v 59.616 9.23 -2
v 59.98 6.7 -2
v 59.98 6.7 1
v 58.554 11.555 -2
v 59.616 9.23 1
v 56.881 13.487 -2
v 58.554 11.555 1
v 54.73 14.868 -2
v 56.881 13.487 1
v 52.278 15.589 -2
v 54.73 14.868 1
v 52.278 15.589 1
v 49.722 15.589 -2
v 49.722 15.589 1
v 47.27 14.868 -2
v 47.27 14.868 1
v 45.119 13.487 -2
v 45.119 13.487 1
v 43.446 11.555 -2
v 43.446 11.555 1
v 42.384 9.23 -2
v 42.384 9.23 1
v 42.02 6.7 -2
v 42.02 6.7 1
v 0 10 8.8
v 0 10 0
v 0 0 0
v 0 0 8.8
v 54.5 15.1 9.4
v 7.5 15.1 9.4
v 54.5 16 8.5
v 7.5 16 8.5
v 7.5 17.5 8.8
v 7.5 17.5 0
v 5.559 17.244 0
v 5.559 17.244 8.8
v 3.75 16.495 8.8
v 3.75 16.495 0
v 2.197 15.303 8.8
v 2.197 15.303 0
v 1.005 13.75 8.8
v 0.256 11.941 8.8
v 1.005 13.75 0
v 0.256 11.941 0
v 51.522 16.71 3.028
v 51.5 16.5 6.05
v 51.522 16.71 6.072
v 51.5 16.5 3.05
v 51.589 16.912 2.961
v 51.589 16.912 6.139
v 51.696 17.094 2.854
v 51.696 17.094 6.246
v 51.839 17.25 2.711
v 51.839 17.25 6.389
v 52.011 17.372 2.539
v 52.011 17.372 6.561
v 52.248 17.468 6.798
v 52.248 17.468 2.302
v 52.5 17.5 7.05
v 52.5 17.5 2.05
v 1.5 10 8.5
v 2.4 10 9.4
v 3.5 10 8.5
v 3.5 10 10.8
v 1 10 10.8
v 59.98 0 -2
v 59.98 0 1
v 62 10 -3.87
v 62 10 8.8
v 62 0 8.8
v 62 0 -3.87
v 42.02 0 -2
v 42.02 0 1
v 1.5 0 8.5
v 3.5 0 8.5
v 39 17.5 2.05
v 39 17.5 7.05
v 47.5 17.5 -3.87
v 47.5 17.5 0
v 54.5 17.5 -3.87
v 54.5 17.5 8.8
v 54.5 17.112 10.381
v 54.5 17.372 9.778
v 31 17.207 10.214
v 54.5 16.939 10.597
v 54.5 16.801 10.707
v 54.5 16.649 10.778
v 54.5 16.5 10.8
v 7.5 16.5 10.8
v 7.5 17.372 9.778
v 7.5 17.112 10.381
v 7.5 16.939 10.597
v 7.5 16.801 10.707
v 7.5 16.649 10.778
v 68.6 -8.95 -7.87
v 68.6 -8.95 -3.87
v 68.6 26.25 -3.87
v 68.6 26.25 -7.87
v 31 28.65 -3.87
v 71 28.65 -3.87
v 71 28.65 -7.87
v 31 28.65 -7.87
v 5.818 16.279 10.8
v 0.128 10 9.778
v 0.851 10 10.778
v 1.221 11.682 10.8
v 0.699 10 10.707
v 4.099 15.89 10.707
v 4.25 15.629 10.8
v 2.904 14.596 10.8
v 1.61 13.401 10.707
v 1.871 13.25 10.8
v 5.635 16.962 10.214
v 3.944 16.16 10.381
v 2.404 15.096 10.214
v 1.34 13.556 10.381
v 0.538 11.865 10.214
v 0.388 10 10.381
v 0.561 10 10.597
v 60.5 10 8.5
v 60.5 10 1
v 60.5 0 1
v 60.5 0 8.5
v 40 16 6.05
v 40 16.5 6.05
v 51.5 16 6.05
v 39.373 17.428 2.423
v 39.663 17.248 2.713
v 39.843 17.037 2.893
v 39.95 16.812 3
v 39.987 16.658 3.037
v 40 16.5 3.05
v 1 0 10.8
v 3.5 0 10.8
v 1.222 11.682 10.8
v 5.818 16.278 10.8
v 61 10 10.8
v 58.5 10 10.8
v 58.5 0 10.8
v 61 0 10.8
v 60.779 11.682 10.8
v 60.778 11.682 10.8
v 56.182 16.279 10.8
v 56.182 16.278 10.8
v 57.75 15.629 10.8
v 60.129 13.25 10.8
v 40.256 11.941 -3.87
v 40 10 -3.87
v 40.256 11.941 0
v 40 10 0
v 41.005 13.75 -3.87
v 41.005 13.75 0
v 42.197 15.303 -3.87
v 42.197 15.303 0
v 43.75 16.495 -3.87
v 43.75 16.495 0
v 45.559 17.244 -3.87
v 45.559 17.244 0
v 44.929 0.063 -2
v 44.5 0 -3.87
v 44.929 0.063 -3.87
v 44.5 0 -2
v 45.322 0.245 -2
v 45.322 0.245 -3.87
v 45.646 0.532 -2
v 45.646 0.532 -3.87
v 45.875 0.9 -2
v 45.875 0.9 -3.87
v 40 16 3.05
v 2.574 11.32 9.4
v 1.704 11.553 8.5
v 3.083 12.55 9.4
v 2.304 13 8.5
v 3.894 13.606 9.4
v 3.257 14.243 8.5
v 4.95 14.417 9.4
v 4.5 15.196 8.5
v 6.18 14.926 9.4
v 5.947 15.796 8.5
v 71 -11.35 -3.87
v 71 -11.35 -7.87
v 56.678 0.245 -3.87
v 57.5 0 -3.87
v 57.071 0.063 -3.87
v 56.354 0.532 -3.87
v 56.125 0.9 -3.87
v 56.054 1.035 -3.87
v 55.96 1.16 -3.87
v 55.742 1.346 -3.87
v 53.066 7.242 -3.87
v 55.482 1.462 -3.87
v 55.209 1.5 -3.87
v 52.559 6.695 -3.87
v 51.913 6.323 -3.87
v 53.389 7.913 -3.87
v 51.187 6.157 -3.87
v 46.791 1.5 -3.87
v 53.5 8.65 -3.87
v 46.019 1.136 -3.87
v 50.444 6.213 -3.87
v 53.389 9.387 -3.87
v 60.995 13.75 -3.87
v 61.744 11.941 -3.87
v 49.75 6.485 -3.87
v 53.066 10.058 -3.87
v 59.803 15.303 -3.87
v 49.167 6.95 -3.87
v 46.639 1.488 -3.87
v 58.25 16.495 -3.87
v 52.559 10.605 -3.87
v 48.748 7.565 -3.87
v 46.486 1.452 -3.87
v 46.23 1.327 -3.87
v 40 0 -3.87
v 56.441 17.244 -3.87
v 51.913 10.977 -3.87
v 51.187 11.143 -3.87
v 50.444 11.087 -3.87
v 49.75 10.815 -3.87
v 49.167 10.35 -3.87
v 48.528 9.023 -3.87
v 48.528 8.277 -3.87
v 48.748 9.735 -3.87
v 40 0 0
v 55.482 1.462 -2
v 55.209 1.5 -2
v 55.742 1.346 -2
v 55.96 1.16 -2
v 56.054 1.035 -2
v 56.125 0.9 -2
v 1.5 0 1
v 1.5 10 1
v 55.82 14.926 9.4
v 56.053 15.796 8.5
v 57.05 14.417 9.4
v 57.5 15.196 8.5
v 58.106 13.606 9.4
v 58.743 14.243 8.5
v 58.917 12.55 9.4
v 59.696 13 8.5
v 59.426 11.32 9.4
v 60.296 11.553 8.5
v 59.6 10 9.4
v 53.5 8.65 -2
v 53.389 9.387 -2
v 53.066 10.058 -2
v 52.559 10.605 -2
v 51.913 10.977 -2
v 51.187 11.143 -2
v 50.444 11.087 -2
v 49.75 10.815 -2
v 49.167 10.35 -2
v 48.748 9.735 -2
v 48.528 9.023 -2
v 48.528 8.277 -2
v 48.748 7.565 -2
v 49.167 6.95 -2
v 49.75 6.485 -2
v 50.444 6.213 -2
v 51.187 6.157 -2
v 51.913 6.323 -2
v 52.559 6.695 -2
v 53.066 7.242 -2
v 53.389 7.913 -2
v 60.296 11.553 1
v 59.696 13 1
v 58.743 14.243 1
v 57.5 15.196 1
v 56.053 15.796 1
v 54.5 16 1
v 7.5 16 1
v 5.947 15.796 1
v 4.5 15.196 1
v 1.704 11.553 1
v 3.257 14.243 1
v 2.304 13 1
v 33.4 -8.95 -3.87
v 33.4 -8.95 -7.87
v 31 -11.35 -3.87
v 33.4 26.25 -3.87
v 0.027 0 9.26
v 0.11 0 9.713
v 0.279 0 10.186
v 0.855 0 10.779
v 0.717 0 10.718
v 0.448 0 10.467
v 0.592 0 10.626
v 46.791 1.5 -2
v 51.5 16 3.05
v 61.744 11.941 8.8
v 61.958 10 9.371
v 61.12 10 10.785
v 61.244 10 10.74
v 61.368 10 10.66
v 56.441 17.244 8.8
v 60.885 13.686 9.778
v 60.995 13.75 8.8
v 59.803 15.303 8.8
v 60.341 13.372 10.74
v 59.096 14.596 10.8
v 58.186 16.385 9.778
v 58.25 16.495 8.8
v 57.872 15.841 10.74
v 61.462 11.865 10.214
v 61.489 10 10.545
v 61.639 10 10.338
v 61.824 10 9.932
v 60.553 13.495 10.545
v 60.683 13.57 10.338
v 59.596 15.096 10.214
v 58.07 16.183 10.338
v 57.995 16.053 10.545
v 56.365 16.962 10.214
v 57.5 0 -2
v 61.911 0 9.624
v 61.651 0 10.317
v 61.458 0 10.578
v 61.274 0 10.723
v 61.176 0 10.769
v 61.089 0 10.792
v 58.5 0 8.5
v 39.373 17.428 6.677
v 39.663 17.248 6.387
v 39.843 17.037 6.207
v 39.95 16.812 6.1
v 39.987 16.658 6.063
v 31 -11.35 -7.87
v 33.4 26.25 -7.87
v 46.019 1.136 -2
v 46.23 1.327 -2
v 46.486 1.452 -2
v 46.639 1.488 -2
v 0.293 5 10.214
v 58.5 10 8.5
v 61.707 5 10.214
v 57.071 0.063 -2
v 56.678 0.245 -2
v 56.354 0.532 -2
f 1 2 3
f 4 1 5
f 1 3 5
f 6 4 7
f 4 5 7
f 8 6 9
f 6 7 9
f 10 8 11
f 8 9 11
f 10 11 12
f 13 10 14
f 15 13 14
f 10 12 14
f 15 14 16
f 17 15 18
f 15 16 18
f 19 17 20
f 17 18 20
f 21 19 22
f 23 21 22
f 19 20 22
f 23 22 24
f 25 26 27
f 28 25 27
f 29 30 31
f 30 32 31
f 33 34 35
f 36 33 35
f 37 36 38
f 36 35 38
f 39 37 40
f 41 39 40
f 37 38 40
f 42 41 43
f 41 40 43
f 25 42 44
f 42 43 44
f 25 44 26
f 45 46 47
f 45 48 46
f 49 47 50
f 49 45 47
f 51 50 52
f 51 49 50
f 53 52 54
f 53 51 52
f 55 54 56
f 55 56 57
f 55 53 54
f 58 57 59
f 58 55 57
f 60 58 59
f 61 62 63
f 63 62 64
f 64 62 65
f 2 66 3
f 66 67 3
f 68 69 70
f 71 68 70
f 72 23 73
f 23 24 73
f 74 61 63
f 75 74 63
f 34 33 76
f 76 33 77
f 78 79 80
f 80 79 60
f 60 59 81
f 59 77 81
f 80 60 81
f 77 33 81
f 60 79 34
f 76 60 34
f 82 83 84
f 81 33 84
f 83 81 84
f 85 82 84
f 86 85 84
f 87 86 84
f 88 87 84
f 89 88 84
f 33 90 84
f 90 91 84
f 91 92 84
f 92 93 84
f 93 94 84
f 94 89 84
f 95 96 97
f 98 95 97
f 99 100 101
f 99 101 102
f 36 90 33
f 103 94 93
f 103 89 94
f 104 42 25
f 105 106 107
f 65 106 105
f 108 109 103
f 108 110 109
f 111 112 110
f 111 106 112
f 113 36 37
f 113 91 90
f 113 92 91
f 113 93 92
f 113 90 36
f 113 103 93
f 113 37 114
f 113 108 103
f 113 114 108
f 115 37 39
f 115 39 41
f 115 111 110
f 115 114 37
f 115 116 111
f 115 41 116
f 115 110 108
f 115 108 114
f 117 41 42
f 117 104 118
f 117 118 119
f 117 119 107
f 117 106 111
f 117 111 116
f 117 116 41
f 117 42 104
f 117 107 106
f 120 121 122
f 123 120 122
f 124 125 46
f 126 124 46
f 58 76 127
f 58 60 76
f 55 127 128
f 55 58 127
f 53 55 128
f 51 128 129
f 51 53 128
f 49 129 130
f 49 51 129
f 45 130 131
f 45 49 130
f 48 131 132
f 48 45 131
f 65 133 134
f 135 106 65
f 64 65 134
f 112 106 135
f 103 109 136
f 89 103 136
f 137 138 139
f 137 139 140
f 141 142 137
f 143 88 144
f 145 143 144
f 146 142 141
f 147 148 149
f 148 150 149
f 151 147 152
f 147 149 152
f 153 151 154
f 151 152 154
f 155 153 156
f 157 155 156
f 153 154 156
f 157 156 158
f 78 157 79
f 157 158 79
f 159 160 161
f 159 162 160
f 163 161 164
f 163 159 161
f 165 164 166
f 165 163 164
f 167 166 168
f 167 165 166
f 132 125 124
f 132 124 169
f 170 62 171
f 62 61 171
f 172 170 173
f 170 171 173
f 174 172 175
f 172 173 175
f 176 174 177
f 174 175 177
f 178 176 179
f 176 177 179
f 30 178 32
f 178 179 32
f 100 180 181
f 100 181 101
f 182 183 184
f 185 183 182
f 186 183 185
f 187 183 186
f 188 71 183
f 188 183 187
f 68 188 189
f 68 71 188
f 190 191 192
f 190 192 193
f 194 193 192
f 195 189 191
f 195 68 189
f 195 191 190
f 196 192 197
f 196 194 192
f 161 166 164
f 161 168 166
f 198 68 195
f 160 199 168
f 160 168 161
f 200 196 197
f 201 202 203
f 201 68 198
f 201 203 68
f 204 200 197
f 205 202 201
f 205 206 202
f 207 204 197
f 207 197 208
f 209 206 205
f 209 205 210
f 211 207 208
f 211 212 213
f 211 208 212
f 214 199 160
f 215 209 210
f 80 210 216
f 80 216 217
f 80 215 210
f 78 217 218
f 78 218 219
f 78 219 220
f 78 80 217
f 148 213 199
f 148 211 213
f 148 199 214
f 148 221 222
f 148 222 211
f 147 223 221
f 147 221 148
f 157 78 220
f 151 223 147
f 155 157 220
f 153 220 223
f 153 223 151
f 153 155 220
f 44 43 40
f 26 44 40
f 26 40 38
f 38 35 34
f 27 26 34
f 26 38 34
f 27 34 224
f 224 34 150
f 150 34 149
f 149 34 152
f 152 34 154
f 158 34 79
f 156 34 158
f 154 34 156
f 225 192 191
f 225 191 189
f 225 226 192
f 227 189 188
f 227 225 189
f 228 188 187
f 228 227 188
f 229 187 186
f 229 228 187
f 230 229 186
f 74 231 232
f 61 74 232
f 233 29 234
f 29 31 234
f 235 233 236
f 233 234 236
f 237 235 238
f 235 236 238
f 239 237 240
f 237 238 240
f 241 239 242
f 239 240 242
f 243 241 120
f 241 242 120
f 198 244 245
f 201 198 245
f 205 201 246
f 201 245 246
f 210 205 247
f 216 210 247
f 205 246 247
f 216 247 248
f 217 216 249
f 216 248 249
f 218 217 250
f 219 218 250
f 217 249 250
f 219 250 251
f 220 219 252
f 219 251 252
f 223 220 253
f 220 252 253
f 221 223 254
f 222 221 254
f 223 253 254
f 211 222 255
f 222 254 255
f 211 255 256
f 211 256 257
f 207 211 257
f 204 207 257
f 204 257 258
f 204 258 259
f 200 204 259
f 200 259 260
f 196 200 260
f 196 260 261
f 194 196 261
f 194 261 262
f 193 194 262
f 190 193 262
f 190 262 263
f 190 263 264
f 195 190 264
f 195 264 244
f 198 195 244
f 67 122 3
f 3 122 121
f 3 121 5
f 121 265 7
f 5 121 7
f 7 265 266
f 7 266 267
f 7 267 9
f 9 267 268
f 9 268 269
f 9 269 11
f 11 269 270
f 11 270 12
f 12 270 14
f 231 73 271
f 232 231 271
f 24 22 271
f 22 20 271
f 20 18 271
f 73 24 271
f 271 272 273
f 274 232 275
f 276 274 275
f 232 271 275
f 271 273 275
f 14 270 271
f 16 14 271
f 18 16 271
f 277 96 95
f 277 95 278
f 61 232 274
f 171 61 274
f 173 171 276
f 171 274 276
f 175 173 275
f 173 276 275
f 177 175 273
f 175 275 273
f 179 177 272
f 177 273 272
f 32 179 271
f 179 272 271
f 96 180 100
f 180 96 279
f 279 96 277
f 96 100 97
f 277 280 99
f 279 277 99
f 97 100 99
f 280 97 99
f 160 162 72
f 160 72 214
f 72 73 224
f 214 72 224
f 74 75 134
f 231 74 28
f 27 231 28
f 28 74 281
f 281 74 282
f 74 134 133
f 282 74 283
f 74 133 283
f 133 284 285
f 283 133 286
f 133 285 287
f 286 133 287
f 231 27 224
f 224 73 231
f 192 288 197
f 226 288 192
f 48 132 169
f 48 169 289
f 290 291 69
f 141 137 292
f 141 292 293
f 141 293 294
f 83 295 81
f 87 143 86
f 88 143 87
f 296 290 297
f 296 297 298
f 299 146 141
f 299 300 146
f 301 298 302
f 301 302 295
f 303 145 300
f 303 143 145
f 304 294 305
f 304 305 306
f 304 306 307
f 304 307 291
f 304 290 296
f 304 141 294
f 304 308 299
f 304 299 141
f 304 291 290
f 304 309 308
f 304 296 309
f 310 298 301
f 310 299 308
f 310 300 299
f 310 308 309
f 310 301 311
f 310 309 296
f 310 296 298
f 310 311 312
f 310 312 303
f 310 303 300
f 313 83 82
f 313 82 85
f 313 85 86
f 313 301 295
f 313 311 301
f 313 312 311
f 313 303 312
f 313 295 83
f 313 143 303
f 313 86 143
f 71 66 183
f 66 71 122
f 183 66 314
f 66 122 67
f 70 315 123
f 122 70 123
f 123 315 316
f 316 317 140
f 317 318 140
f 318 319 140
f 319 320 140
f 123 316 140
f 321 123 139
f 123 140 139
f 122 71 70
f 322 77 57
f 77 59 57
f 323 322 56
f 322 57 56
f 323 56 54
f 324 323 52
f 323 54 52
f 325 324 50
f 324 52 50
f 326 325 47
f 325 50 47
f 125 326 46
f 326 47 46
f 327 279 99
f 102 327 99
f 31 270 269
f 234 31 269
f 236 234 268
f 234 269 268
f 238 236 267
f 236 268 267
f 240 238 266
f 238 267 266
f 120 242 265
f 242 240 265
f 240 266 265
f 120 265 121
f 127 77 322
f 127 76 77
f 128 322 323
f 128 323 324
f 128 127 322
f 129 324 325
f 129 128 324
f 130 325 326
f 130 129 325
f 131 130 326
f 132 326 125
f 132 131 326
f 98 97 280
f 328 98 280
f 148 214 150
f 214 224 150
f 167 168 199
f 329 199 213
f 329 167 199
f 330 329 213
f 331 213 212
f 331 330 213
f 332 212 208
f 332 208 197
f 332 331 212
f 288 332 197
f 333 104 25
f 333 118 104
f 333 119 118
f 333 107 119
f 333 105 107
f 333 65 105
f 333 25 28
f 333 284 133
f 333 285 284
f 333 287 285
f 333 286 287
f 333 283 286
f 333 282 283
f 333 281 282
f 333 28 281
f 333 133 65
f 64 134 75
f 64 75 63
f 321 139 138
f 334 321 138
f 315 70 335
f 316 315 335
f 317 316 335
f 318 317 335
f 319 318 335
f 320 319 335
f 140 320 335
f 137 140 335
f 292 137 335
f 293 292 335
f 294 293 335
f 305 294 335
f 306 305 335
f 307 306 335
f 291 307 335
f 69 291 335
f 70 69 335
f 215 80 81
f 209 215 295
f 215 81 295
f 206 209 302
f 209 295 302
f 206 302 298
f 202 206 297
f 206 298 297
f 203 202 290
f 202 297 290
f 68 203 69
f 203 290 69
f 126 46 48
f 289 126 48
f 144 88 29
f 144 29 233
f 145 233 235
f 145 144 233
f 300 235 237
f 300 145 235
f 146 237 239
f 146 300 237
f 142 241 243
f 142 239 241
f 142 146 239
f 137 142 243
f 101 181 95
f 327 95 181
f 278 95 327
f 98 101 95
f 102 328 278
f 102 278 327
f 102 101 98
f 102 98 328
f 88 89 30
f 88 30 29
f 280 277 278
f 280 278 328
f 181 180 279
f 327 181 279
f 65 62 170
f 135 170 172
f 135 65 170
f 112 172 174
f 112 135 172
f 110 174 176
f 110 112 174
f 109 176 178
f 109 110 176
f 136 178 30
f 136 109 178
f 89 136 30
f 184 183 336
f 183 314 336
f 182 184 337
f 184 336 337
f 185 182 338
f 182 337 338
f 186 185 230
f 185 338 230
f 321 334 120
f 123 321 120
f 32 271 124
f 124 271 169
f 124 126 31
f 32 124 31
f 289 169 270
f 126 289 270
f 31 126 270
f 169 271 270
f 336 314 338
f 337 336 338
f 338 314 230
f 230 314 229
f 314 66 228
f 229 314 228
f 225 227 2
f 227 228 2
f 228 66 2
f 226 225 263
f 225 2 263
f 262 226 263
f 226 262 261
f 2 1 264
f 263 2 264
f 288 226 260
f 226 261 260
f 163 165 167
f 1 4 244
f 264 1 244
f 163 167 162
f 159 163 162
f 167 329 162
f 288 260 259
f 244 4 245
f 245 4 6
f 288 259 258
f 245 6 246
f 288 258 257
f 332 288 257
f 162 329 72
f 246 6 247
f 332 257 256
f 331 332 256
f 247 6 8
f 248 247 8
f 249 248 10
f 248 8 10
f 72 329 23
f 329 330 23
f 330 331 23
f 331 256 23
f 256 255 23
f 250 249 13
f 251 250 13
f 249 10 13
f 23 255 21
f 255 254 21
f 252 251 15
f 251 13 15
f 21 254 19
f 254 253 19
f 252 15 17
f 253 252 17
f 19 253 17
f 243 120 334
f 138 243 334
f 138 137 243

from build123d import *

# Parameters (mm, degrees)
BOSS_EXTRUDE1_DEPTH = 10.8
BOSS_EXTRUDE2_DEPTH = 1
SKETCH3_W           = 2
SKETCH3_H           = 10
BOSS_EXTRUDE3_DEPTH = 2.3
FILLET1_SIZE        = 2
FILLET1_SIZE_2      = 1
CUT_EXTRUDE1_REACH  = 67.321
SKETCH4_W           = 11.5
SKETCH4_H           = 3
BOSS_EXTRUDE4_DEPTH = 2.3
CHAMFER1_SIZE       = 1.5
CUT_EXTRUDE2_DEPTH  = 2
BOSS_EXTRUDE6_DEPTH = 2
FILLET2_R           = 1
BOSS_EXTRUDE7_DEPTH = 1.87
SKETCH11_R          = 2.5
CUT_EXTRUDE3_DEPTH  = 66.681732761
SKETCH19_W          = 10
SKETCH19_H          = 1.87
CUT_EXTRUDE5_DEPTH  = 1.5
FILLET7_R           = 1.5
FILLET8_R           = 1
SKETCH20_W          = 40
SKETCH20_H          = 40
SKETCH20_W_2        = 35.2
SKETCH20_H_2        = 35.2
BOSS_EXTRUDE8_DEPTH = 4


with BuildPart() as part:
    # Sketch1 → Boss-Extrude1 (new body)
    with BuildSketch(Plane.XY):
        with BuildLine():
            Line((31, 16), (31, 17.5))
            Line((31, 17.5), (7.5, 17.5))
            ThreePointArc((7.5, 17.5), (2.196699141, 15.303300859), (0, 10))
            Line((0, 10), (0, 0))
            Line((0, 0), (1.5, 0))
            Line((1.5, 0), (1.5, 10))
            ThreePointArc((1.5, 10), (3.257359313, 14.242640687), (7.5, 16))
            Line((7.5, 16), (31, 16))
        make_face()
        with BuildLine():
            Line((54.5, 17.5), (31, 17.5))
            Line((31, 17.5), (31, 16))
            Line((31, 16), (54.5, 16))
            ThreePointArc((54.5, 16), (58.742640687, 14.242640687), (60.5, 10))
            Line((60.5, 10), (60.5, 0))
            Line((60.5, 0), (62, 0))
            Line((62, 0), (62, 10))
            ThreePointArc((62, 10), (59.803300859, 15.303300859), (54.5, 17.5))
        make_face()
    extrude(amount=BOSS_EXTRUDE1_DEPTH)


with BuildPart() as body_2:
    # Sketch2 → Boss-Extrude2 (new body)
    with BuildSketch(Plane(origin=(0, 0, 0), x_dir=(-1, 0, 0), z_dir=(0, 0, -1))):
        with BuildLine():
            Line((-1.5, 0), (-1.5, 10))
            ThreePointArc((-1.5, 10), (-3.257359313, 14.242640687), (-7.5, 16))
            Line((-7.5, 16), (-54.5, 16))
            ThreePointArc((-54.5, 16), (-58.742640687, 14.242640687), (-60.5, 10))
            Line((-60.5, 10), (-60.5, 0))
            Line((-60.5, 0), (-1.5, 0))
        make_face()
    extrude(amount=-BOSS_EXTRUDE2_DEPTH)

    # Combine1: union part
    add(part.part)

    # Sketch3 → Boss-Extrude3 (add)
    with BuildSketch(Plane.XY.offset(10.8)):
        with Locations((2.5, 5)):
            Rectangle(SKETCH3_W, SKETCH3_H)
        with Locations((59.5, 5)):
            Rectangle(SKETCH3_W, SKETCH3_H)
    extrude(amount=-BOSS_EXTRUDE3_DEPTH)

    # Fillet1
    # a fillet whose section is not a circle: 2, 1 mm, written as the material it takes off along each edge
    with BuildSketch(Plane(origin=(0, 10, 10.8), x_dir=(0, 0, -1), z_dir=(0, -1, 0))) as fillet1_piece_1:
        with BuildLine():
            Bezier((FILLET1_SIZE, 0), (0, 0), (0, FILLET1_SIZE_2), weights=[1, 0.707106781, 1])
            Line((0, FILLET1_SIZE_2), (0, 0))
            Line((0, 0), (FILLET1_SIZE, 0))
        make_face()
    extrude(amount=15, mode=Mode.SUBTRACT)
    with BuildSketch(Plane(origin=(62, -5, 10.8), x_dir=(-1, 0, 0), z_dir=(0, 1, 0))) as fillet1_piece_2:
        with BuildLine():
            Bezier((FILLET1_SIZE_2, 0), (0, 0), (0, -FILLET1_SIZE), weights=[1, 0.707106781, 1])
            Line((0, -FILLET1_SIZE), (0, 0))
            Line((0, 0), (FILLET1_SIZE_2, 0))
        make_face()
    extrude(amount=15, mode=Mode.SUBTRACT)
    with BuildSketch(Plane(origin=(7.5, 10, 10.8), x_dir=(0, 1, 0), z_dir=(1, 0, 0))) as fillet1_piece_3:
        with BuildLine():
            Bezier((7.5, -FILLET1_SIZE), (7.5, 0), (7.5 - FILLET1_SIZE_2, 0), weights=[1, 0.707106781, 1])
            Line((7.5 - FILLET1_SIZE_2, 0), (7.5, 0))
            Line((7.5, 0), (7.5, -FILLET1_SIZE))
        make_face()
    revolve(axis=Axis((7.5, 10, 10.8), (0, 0, 1)), revolution_arc=90, mode=Mode.SUBTRACT)
    with BuildSketch(Plane(origin=(54.5, 10, 10.8), x_dir=(1, 0, 0), z_dir=(0, -1, 0))) as fillet1_piece_4:
        with BuildLine():
            Bezier((7.5, -FILLET1_SIZE), (7.5, 0), (7.5 - FILLET1_SIZE_2, 0), weights=[1, 0.707106781, 1])
            Line((7.5 - FILLET1_SIZE_2, 0), (7.5, 0))
            Line((7.5, 0), (7.5, -FILLET1_SIZE))
        make_face()
    revolve(axis=Axis((54.5, 10, 10.8), (0, 0, 1)), revolution_arc=90, mode=Mode.SUBTRACT)
    with BuildSketch(Plane(origin=(7.5, 17.5, 10.8), x_dir=(0, 0, -1), z_dir=(1, 0, 0))) as fillet1_piece_5:
        with BuildLine():
            Bezier((FILLET1_SIZE, 0), (0, 0), (0, -FILLET1_SIZE_2), weights=[1, 0.707106781, 1])
            Line((0, -FILLET1_SIZE_2), (0, 0))
            Line((0, 0), (FILLET1_SIZE, 0))
        make_face()
    extrude(amount=47, mode=Mode.SUBTRACT)

    # Sketch4 → Cut-Extrude1 (cut, up to next)
    with BuildSketch(Plane(origin=(0, 17.5, 0), x_dir=(1, 0, 0), z_dir=(0, 1, 0)), mode=Mode.PRIVATE) as cut_extrude1_sk1:
        with Locations((45.75, -4.55)):
            Rectangle(SKETCH4_W, SKETCH4_H)
    cut_extrude1_tool1 = extrude(cut_extrude1_sk1.sketch, amount=-CUT_EXTRUDE1_REACH, mode=Mode.PRIVATE) & body_2.part
    add(cut_extrude1_tool1.solids().sort_by_distance((45.75, 17.5, 4.55))[0], mode=Mode.SUBTRACT)

    # Sketch5 → Boss-Extrude4 (add)
    with BuildSketch(Plane.XY.offset(10.8)):
        with BuildLine():
            Line((7.5, 15), (54.5, 15))
            ThreePointArc((54.5, 15), (58.035533906, 13.535533906), (59.5, 10))
            Line((59.5, 10), (60.5, 10))
            ThreePointArc((60.5, 10), (58.742640687, 14.242640687), (54.5, 16))
            Line((54.5, 16), (7.5, 16))
            ThreePointArc((7.5, 16), (3.257359313, 14.242640687), (1.5, 10))
            Line((1.5, 10), (2.5, 10))
            ThreePointArc((2.5, 10), (3.964466094, 13.535533906), (7.5, 15))
        make_face()
    extrude(amount=-BOSS_EXTRUDE4_DEPTH)

    # Chamfer1
    chamfer1_edges = [body_2.edges().sort_by_distance(p)[0] for p in [
        (3.964466094, 13.535533906, 10.8),
        (31, 15, 10.8),
        (58.035533906, 13.535533906, 10.8),
    ]]
    chamfer(chamfer1_edges, length=CHAMFER1_SIZE - 0.0001)  # a hair under: the kernel refuses the full size

    # Chamfer3: read off the stored shape, not the designer's step
    # Chamfer3: loft between two sections, ruled curve by curve
    chamfer3_from = [
        Edge.make_three_point_arc((2.4, 10, 9.4), (3.893755416, 13.606244584, 9.4), (7.5, 15.1, 9.4)),
        Edge.make_three_point_arc((54.5, 15.1, 9.4), (58.106244584, 13.606244584, 9.4), (59.6, 10, 9.4)),
        Edge.make_line((7.5, 15.1, 9.4), (54.5, 15.1, 9.4)),
        Edge.make_line((59.6, 10, 9.4), (2.4, 10, 9.4)),
    ]
    chamfer3_to = [
        Edge.make_three_point_arc((1.5, 10, 8.5), (3.257359313, 14.242640687, 8.5), (7.5, 16, 8.5)),
        Edge.make_three_point_arc((54.5, 16, 8.5), (58.742640687, 14.242640687, 8.5), (60.5, 10, 8.5)),
        Edge.make_line((7.5, 16, 8.5), (54.5, 16, 8.5)),
        Edge.make_line((60.5, 10, 8.5), (1.5, 10, 8.5)),
    ]
    chamfer3 = Solid(Shell([*[Face.make_surface_from_curves(chamfer3_from[k], chamfer3_to[k]) for k in range(4)], Face(Wire(chamfer3_from)), Face(Wire(chamfer3_to))]))
    add(chamfer3, mode=Mode.SUBTRACT)

    # Sketch6 → Cut-Extrude2 (cut)
    with BuildSketch(Plane(origin=(0, 0, 0), x_dir=(-1, 0, 0), z_dir=(0, 0, -1))):
        with BuildLine():
            Line((-59.98, 0), (-59.98, 6.7))
            ThreePointArc((-59.98, 6.7), (-51, 15.68), (-42.02, 6.7))
            Line((-42.02, 6.7), (-42.02, 0))
            Line((-42.02, 0), (-59.98, 0))
        make_face()
    extrude(amount=-CUT_EXTRUDE2_DEPTH, mode=Mode.SUBTRACT)

    # Sketch9 → Boss-Extrude6 (add)
    with BuildSketch(Plane(origin=(0, 0, 0), x_dir=(-1, 0, 0), z_dir=(0, 0, -1))):
        with BuildLine():
            Line((-62, 10), (-62, 0))
            Line((-62, 0), (-59.98, 0))
            Line((-59.98, 0), (-59.98, 6.7))
            ThreePointArc((-59.98, 6.7), (-51, 15.68), (-42.02, 6.7))
            Line((-42.02, 6.7), (-42.02, 0))
            Line((-42.02, 0), (-40, 0))
            Line((-40, 0), (-40, 10))
            ThreePointArc((-40, 10), (-42.196699141, 15.303300859), (-47.5, 17.5))
            Line((-47.5, 17.5), (-54.5, 17.5))
            ThreePointArc((-54.5, 17.5), (-59.803300859, 15.303300859), (-62, 10))
        make_face()
    extrude(amount=BOSS_EXTRUDE6_DEPTH)

    # Fillet2
    fillet2_edges = [body_2.edges().sort_by_distance(p)[0] for p in [
        (51.5, 17.5, 4.55),
        (45.75, 17.5, 3.05),
        (40, 17.5, 4.55),
        (45.75, 17.5, 6.05),
    ]]
    fillet(fillet2_edges, radius=FILLET2_R)

    # Sketch10 → Boss-Extrude7 (add)
    with BuildSketch(Plane(origin=(0, 0, -2), x_dir=(-1, 0, 0), z_dir=(0, 0, -1))):
        with BuildLine():
            Line((-62, 10), (-62, 0))
            Line((-62, 0), (-40, 0))
            Line((-40, 0), (-40, 10))
            ThreePointArc((-40, 10), (-42.196699141, 15.303300859), (-47.5, 17.5))
            Line((-47.5, 17.5), (-54.5, 17.5))
            ThreePointArc((-54.5, 17.5), (-59.803300859, 15.303300859), (-62, 10))
        make_face()
    extrude(amount=BOSS_EXTRUDE7_DEPTH)

    # Sketch11 → Cut-Extrude3 (cut, through all)
    with BuildSketch(Plane.XY.offset(-2)):
        with Locations((51, 8.65)):
            Circle(SKETCH11_R)
    extrude(amount=-CUT_EXTRUDE3_DEPTH, mode=Mode.SUBTRACT)

    # Sketch19 → Cut-Extrude5 (cut)
    with BuildSketch(Plane.XZ):
        with Locations((51, -2.935)):
            Rectangle(SKETCH19_W, SKETCH19_H)
    extrude(amount=-CUT_EXTRUDE5_DEPTH, mode=Mode.SUBTRACT)

    # Fillet7
    fillet7_edges = [body_2.edges().sort_by_distance(p)[0] for p in [
        (46, 0, -2.935),
        (56, 0, -2.935),
    ]]
    fillet(fillet7_edges, radius=FILLET7_R - 0.0001)  # a hair under: the kernel refuses the full size

    # Fillet8
    fillet8_edges = [body_2.edges().sort_by_distance(p)[0] for p in [
        (56, 1.5, -2.935),
        (46, 1.5, -2.935),
    ]]
    fillet(fillet8_edges, radius=FILLET8_R)


with BuildPart() as body_2_2:
    # Sketch20 → Boss-Extrude8 (new body)
    with BuildSketch(Plane(origin=(0, 0, -3.87), x_dir=(-1, 0, 0), z_dir=(0, 0, -1))):
        with Locations((-51, 8.65)):
            Rectangle(SKETCH20_W, SKETCH20_H)
        with Locations((-51, 8.65)):
            Rectangle(SKETCH20_W_2, SKETCH20_H_2, mode=Mode.SUBTRACT)
    extrude(amount=BOSS_EXTRUDE8_DEPTH)


solid = Compound([body_2.part, body_2_2.part])
